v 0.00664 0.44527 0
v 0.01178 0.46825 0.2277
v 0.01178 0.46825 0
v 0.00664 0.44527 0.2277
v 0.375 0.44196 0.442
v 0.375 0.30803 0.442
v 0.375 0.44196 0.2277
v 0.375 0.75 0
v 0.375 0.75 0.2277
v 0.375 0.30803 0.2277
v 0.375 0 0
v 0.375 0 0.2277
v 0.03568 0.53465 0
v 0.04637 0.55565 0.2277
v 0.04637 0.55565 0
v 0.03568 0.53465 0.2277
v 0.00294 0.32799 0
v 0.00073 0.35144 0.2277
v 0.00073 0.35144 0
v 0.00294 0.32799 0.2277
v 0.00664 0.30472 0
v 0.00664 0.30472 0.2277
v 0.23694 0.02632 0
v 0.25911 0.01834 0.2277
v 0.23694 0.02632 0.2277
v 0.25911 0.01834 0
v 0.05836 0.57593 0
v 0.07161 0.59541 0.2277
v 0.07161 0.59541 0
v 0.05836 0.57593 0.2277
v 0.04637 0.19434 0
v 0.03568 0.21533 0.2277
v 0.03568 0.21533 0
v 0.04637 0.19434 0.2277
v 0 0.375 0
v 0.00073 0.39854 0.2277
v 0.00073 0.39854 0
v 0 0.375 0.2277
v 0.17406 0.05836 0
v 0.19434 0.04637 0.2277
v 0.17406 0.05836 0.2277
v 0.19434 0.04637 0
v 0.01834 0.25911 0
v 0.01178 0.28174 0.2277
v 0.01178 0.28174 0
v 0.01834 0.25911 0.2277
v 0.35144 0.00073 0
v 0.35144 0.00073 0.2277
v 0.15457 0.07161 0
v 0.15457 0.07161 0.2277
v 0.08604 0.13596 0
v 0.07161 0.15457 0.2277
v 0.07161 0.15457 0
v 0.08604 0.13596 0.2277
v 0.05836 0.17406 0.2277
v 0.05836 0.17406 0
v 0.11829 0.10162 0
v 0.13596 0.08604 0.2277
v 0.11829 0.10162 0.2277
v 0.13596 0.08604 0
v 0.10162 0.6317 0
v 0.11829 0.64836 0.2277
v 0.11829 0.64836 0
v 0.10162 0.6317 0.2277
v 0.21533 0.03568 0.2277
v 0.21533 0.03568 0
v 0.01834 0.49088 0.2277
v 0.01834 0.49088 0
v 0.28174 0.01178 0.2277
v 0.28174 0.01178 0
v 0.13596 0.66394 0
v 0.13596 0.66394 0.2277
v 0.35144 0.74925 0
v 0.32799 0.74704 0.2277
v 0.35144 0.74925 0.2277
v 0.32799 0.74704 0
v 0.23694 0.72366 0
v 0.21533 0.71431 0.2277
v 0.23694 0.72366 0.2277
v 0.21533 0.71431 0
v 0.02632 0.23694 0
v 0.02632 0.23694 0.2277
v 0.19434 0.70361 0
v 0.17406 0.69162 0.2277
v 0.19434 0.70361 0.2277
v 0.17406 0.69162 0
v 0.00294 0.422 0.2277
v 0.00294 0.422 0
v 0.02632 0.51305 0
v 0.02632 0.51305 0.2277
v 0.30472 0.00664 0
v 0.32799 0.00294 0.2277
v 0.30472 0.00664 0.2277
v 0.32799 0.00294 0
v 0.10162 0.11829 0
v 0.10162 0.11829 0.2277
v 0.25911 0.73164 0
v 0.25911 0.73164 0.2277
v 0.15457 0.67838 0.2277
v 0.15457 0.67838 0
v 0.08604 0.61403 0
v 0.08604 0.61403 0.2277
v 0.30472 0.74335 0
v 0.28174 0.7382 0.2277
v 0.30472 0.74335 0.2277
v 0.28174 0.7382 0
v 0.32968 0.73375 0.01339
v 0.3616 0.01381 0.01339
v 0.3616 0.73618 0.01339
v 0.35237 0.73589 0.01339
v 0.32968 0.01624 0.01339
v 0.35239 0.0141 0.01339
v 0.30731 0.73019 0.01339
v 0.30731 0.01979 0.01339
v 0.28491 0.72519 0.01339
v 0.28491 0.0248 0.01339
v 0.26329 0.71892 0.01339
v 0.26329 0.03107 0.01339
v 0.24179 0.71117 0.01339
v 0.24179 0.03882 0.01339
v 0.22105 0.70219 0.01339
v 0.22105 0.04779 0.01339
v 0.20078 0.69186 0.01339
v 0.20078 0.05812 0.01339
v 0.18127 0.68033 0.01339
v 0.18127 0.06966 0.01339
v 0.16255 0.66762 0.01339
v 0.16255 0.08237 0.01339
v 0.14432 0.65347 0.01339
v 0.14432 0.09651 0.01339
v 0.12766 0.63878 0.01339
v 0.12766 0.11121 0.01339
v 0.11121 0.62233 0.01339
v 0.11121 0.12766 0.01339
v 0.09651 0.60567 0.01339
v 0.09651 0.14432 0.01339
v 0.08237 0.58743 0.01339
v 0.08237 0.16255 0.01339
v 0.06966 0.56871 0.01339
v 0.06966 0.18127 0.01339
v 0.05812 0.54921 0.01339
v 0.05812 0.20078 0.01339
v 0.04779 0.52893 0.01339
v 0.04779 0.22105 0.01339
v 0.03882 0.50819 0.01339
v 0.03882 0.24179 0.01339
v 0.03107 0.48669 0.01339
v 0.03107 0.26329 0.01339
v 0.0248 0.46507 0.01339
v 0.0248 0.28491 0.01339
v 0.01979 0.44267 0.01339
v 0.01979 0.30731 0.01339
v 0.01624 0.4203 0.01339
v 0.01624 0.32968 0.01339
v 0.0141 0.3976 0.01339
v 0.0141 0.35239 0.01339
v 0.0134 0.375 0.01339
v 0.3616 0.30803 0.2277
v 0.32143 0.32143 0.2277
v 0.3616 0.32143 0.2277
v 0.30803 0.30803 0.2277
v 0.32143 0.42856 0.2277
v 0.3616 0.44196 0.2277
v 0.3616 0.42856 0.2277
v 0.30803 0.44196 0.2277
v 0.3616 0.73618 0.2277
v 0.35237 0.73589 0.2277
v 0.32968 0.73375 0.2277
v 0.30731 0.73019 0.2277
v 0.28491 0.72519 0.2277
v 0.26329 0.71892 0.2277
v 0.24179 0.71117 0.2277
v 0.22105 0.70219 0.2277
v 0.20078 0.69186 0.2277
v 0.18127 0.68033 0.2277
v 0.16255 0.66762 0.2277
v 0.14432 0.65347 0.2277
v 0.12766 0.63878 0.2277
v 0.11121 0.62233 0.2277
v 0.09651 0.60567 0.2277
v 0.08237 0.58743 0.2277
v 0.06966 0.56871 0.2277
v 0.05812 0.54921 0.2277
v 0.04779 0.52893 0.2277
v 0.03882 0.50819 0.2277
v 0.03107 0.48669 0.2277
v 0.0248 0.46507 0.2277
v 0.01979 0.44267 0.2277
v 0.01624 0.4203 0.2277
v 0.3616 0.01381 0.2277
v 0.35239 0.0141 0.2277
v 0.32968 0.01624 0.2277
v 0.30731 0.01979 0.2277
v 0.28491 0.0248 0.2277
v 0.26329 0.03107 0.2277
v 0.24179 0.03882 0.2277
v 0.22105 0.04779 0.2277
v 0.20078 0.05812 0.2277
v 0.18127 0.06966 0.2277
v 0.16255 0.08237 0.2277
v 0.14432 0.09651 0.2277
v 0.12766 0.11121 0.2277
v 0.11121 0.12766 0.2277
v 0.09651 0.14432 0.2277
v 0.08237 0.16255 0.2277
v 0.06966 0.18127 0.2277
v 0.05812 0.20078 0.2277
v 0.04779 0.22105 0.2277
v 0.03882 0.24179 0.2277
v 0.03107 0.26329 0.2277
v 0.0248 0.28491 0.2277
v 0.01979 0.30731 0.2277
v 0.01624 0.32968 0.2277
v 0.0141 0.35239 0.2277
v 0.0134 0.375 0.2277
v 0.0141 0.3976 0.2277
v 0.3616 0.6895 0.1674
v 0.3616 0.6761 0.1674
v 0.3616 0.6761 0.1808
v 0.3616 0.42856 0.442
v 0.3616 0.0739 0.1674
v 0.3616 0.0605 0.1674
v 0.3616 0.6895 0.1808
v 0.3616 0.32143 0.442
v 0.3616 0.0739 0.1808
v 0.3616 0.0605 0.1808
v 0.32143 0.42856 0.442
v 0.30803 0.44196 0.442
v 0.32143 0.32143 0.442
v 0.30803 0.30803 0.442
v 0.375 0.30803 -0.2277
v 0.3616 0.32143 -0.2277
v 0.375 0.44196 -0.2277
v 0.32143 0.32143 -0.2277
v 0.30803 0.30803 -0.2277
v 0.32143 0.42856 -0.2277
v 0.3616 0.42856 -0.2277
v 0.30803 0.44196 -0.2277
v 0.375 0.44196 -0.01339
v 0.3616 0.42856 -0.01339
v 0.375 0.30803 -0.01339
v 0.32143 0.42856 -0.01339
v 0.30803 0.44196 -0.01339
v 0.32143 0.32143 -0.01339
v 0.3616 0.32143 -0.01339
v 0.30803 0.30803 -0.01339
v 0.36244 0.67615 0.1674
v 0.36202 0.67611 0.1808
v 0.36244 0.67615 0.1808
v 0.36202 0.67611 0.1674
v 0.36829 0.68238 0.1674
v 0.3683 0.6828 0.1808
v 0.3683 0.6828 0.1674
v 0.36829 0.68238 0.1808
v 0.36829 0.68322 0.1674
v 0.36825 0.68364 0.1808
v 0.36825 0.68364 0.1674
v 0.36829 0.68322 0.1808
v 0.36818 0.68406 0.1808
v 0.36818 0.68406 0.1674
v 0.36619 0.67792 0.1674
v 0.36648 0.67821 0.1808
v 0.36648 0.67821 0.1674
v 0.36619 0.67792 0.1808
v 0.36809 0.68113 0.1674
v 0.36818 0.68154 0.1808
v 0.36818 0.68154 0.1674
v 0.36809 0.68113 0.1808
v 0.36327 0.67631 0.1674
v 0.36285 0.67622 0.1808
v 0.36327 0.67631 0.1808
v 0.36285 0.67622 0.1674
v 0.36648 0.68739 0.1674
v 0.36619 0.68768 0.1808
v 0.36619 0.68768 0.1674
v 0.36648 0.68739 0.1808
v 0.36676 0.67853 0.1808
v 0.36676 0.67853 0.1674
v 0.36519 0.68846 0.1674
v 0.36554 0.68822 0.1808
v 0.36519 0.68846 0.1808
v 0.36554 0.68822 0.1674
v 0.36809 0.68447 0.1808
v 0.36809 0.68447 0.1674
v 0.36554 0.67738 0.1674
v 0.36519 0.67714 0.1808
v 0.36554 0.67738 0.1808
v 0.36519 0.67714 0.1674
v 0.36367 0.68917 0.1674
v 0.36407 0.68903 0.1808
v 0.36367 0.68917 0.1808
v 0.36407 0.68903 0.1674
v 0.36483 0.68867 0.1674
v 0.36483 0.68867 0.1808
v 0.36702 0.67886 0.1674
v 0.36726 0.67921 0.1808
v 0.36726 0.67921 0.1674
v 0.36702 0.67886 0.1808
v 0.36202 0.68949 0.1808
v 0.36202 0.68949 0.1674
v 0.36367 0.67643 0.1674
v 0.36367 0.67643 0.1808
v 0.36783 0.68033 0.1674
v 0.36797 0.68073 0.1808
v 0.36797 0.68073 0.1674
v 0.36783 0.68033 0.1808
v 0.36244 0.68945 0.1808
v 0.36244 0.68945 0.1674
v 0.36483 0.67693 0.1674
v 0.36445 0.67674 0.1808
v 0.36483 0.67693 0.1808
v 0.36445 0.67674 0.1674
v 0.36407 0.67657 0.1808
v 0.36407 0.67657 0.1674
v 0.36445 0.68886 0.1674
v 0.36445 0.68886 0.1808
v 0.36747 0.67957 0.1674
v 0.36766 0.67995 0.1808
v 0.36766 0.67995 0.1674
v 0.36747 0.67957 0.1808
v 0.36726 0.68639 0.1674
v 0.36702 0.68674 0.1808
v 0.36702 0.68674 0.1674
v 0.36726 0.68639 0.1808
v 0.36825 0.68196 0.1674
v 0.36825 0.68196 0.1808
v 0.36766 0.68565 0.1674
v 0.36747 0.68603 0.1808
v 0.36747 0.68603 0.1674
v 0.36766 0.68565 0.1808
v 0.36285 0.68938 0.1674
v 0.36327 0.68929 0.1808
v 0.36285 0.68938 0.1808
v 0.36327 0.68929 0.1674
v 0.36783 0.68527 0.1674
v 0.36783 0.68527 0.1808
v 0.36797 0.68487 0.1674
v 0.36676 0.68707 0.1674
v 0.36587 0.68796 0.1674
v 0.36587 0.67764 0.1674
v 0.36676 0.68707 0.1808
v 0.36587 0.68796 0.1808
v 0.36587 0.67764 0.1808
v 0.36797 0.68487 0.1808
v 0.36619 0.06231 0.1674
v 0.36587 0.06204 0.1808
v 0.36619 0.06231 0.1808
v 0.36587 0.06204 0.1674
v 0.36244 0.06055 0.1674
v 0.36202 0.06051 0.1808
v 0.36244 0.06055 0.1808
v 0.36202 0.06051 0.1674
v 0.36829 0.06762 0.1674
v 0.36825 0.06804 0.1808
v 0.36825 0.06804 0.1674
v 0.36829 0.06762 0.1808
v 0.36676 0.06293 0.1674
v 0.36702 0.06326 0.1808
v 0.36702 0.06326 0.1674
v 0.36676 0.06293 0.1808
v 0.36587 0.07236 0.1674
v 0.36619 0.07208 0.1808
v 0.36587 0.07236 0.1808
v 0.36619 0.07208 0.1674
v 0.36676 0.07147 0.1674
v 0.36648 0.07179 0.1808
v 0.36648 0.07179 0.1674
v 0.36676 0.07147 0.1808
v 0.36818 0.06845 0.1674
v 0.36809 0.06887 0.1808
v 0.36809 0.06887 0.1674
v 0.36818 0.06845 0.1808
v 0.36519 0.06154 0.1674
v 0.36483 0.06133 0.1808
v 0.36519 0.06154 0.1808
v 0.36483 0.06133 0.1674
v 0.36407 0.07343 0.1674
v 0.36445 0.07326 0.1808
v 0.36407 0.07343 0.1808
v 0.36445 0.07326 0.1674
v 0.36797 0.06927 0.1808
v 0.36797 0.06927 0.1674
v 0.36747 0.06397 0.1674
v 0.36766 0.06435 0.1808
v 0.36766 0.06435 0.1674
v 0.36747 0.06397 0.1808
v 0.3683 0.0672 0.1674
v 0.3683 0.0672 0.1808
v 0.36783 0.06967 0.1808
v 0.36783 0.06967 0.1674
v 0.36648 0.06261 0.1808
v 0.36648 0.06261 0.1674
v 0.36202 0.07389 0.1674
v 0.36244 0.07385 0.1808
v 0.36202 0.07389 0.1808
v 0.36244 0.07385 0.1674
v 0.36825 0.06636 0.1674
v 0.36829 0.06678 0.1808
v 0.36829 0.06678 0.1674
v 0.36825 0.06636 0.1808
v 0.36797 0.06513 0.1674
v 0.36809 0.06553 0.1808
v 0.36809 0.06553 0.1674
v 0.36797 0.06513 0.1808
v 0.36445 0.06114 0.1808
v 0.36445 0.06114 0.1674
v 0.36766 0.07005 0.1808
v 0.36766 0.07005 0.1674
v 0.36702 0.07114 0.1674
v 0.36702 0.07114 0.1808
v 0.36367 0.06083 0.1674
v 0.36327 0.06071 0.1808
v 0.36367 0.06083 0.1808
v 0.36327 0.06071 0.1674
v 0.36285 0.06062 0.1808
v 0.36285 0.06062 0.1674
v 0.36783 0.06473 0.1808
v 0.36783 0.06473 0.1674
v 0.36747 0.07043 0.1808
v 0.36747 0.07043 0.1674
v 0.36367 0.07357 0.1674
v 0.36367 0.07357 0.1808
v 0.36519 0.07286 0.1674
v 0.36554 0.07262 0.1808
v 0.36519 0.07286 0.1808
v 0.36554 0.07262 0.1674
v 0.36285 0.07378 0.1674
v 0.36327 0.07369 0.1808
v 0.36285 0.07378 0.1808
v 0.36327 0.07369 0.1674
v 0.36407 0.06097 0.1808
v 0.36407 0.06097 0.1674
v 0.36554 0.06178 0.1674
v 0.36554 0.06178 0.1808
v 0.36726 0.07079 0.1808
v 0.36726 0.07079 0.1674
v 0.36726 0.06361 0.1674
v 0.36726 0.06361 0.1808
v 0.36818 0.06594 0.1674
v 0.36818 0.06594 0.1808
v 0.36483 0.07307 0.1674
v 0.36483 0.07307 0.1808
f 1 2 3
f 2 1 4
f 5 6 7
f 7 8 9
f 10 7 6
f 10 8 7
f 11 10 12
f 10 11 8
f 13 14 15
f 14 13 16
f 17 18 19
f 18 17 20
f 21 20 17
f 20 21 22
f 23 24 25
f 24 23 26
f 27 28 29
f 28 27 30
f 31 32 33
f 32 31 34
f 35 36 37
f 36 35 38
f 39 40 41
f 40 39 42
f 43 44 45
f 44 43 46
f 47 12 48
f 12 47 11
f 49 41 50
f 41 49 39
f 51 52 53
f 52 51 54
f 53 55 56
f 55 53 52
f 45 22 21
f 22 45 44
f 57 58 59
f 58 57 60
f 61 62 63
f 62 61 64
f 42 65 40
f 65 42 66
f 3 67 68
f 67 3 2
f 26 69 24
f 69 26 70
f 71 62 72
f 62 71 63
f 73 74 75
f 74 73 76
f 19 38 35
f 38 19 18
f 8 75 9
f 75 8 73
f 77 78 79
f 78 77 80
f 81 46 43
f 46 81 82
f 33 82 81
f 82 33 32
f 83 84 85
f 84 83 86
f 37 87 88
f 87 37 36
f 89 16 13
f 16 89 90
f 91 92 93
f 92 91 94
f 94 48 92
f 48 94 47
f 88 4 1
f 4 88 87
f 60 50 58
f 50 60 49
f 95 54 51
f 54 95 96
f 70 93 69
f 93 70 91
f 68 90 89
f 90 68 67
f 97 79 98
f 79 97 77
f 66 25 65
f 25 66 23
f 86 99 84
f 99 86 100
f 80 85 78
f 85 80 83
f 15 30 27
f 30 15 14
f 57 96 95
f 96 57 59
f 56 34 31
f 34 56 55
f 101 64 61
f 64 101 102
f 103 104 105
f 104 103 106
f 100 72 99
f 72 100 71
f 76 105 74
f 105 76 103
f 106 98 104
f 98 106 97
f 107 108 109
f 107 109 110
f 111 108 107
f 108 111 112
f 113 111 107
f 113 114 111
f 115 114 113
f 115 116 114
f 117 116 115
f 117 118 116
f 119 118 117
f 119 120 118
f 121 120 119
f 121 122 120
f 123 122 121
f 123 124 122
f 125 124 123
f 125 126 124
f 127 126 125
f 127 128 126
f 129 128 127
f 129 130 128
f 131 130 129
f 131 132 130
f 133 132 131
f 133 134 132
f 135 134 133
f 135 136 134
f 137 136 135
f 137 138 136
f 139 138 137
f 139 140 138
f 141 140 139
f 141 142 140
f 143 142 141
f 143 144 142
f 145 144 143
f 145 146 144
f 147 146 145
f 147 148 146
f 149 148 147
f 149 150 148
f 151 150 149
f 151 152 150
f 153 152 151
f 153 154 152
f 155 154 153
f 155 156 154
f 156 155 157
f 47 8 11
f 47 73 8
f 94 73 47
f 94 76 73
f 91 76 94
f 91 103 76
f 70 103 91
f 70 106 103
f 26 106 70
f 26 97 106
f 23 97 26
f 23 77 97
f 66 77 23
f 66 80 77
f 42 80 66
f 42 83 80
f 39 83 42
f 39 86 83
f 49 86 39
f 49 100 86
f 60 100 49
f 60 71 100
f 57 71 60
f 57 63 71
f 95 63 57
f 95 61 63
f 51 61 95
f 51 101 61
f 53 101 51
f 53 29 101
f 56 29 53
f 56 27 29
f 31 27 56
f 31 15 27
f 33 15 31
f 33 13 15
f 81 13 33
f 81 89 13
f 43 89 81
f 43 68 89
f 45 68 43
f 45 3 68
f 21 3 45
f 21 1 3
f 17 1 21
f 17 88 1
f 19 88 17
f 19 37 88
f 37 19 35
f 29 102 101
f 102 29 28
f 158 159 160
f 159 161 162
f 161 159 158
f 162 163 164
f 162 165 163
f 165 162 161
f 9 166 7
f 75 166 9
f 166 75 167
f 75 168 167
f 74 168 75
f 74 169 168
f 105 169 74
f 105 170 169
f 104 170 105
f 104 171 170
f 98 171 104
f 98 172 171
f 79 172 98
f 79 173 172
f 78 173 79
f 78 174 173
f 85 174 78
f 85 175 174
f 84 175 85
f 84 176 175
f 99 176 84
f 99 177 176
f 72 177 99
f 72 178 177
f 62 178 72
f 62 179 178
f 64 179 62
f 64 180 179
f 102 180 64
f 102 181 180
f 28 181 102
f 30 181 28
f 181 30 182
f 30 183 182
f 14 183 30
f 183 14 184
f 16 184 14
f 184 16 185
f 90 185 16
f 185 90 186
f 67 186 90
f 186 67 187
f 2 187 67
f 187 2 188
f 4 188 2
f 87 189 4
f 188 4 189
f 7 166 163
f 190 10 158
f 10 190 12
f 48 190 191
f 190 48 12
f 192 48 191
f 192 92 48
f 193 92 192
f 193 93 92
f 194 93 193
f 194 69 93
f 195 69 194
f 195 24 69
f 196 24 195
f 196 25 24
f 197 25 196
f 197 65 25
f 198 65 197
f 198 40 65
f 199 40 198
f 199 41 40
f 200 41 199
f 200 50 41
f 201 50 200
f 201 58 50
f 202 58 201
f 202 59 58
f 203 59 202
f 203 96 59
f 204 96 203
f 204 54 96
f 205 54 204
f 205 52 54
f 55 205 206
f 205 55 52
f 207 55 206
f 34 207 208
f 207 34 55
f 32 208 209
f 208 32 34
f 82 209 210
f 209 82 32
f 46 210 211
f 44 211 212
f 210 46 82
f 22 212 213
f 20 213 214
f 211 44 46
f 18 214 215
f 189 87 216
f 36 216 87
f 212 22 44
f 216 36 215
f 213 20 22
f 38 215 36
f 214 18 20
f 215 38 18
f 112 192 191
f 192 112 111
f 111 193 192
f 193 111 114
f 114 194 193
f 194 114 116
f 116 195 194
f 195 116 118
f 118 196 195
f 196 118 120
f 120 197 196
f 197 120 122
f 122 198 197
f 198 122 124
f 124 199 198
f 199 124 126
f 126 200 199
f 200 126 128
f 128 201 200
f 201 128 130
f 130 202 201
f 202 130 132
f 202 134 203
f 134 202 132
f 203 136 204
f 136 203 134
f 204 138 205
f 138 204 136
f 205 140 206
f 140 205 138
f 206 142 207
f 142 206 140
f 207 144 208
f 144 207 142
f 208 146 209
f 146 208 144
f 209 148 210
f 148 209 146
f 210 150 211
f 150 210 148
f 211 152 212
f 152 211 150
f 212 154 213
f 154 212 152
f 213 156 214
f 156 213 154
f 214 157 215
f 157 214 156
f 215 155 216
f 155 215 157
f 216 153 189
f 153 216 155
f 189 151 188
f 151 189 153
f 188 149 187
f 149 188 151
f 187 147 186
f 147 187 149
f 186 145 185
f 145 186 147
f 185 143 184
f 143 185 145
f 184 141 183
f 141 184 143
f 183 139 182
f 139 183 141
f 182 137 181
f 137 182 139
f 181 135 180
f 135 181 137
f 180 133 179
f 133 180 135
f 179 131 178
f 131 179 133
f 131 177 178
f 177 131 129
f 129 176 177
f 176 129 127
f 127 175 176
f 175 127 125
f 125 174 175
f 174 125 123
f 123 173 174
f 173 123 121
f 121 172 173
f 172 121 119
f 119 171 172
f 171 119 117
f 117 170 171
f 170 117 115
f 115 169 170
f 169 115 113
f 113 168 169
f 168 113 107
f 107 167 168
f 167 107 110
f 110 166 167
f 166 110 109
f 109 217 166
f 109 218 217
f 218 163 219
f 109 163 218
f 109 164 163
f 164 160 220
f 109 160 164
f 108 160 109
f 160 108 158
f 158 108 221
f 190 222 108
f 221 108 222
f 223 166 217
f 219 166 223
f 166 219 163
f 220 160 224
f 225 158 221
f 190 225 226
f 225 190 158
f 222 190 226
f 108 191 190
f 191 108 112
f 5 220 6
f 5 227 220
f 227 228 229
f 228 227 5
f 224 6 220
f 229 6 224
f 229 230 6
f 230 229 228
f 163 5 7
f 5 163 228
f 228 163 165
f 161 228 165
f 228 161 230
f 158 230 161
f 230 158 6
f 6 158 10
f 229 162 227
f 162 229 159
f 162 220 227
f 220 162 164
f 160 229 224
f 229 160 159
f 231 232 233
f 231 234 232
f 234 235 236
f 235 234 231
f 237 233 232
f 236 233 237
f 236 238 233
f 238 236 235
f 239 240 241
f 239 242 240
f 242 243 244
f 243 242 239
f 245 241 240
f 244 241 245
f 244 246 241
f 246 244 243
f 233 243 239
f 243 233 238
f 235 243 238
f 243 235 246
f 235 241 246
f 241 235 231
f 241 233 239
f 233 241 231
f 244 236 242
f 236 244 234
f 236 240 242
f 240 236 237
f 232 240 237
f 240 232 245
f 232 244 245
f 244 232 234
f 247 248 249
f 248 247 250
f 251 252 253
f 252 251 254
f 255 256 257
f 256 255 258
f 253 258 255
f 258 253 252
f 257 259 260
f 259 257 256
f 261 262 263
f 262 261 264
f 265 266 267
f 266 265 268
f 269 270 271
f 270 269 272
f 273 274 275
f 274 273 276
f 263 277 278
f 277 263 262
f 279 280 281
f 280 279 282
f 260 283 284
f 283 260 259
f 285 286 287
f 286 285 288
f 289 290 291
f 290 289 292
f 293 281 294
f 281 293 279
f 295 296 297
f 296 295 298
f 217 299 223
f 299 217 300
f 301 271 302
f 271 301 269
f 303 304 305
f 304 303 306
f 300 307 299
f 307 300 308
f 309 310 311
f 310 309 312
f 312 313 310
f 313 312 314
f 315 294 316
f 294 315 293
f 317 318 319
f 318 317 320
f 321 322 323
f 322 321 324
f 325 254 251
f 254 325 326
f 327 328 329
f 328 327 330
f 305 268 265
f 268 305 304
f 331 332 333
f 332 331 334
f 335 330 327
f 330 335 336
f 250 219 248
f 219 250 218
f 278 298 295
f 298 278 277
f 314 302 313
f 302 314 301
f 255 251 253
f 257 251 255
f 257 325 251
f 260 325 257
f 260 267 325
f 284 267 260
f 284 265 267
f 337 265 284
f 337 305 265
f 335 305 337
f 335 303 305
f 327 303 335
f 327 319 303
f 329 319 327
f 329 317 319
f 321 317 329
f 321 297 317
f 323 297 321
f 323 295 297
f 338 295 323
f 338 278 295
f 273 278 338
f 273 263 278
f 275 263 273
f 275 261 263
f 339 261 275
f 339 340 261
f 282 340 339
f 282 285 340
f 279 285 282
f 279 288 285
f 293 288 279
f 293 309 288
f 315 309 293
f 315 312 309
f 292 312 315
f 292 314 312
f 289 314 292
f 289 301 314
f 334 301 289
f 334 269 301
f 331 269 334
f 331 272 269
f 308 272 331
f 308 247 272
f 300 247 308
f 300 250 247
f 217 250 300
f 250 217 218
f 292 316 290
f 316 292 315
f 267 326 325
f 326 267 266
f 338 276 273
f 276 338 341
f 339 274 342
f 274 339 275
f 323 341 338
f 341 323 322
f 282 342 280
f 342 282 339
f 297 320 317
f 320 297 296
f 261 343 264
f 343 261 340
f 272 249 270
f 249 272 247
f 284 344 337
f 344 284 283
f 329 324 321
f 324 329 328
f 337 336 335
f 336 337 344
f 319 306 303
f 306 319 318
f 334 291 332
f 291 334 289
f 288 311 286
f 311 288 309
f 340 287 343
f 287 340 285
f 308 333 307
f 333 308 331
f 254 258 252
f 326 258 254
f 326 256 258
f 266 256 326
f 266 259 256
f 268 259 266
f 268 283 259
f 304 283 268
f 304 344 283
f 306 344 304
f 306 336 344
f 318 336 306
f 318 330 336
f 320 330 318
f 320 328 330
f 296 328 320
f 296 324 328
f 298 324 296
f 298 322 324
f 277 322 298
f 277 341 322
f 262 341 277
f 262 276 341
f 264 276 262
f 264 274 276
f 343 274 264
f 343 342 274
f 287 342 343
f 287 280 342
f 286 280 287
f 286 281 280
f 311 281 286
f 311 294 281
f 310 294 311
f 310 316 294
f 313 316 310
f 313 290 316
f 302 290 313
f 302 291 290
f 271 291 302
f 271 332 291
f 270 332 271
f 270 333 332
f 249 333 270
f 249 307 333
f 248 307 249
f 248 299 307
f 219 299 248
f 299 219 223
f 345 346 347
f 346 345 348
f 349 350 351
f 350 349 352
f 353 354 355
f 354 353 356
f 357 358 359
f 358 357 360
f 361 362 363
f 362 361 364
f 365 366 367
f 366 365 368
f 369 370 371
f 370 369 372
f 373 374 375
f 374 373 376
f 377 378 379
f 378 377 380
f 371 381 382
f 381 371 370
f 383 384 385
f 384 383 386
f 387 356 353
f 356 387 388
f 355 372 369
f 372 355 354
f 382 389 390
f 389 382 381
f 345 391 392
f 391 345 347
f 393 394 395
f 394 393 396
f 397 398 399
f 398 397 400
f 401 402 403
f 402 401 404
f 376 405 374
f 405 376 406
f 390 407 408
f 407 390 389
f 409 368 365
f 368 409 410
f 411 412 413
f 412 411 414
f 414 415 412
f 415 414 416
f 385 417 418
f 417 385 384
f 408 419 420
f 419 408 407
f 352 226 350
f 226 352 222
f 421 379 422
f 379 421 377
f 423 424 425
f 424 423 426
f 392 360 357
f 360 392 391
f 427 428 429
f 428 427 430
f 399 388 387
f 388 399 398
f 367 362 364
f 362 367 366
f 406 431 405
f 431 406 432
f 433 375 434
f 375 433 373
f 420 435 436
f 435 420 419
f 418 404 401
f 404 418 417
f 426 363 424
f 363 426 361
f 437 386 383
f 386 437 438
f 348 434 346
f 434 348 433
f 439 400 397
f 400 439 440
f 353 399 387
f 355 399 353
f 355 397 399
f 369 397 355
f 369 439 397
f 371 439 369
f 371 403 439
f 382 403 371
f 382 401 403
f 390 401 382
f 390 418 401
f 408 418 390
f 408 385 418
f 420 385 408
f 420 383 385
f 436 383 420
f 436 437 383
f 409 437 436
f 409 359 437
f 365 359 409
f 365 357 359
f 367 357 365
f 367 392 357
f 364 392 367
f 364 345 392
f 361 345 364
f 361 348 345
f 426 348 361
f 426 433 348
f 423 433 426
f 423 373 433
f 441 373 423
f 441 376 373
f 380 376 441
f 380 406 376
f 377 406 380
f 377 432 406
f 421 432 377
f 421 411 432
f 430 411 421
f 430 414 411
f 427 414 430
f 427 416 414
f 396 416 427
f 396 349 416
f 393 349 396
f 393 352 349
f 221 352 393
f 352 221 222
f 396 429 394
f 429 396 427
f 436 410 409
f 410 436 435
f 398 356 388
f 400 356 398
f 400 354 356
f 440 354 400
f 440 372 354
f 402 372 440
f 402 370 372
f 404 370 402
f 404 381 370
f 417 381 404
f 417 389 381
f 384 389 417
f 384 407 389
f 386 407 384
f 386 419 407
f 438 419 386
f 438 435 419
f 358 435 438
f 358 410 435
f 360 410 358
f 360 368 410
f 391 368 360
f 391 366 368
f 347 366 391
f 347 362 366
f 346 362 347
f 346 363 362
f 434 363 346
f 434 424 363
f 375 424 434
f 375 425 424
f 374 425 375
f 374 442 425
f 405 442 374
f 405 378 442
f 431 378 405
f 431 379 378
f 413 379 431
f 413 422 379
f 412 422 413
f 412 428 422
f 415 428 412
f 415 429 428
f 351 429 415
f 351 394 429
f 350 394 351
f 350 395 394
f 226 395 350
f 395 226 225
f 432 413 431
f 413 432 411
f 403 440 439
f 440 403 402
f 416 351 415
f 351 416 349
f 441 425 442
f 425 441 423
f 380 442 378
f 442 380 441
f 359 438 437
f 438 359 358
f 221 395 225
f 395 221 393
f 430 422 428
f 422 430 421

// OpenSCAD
// Parameters
length = 0.375;
width = 0.75;
base_height = 0.013393;

wall_reach = 0.2277;
wall_thickness = 0.013393;

post_length = 0.066964;
post_width = 0.133929;
post_reach = 0.442;
post_z_start = 0.2277;

lower_z_start = -0.2277;
lower_z_end = -0.013393;

hole_r = 0.0067;
hole_x = 0.3616;
hole_y1 = 0.6828;
hole_y2 = 0.0672;
hole_z_start = 0.1674;
hole_z_end = 0.1808;

$fn = 100;

// Reusable 2D profile for the base (half-circle on the left)
module base_profile() {
    intersection() {
        translate([length, width / 2]) circle(r = width / 2);
        square([length, width]);
    }
}

// Reusable 2D profile for the wall (hollowed out base)
module wall_profile() {
    difference() {
        base_profile();
        offset(r = -wall_thickness) base_profile();
    }
}

// Reusable 2D profile for the post (hollow rectangular tube)
module post_profile() {
    post_y_offset = (width - post_width) / 2;
    difference() {
        // Outer footprint
        translate([length - post_length, post_y_offset])
            square([post_length, post_width]);
        // Inner void / slot-like outline
        translate([length - post_length + wall_thickness, post_y_offset + wall_thickness])
            square([post_length - 2 * wall_thickness, post_width - 2 * wall_thickness]);
    }
}

// Main solid model
difference() {
    union() {
        // 1. Main base solid (upper-side solid)
        linear_extrude(height = base_height)
            base_profile();
            
        // 2. Second upper-side solid (Wall extending to reach 0.2277)
        linear_extrude(height = wall_reach)
            wall_profile();
            
        // 3. Raised sleeve/post feature (Upper continuation)
        translate([0, 0, post_z_start])
            linear_extrude(height = post_reach - post_z_start)
                post_profile();
                
        // 4. Paired lower continuation beneath the post
        translate([0, 0, lower_z_start])
            linear_extrude(height = lower_z_end - lower_z_start)
                post_profile();
    }
    
    // Circular cuts (vertical slots forming pockets on the inner wall)
    // Occupying the narrow height band from 0.1674 to 0.1808
    translate([hole_x, hole_y1, hole_z_start])
        cylinder(h = hole_z_end - hole_z_start, r = hole_r);
        
    translate([hole_x, hole_y2, hole_z_start])
        cylinder(h = hole_z_end - hole_z_start, r = hole_r);
}
